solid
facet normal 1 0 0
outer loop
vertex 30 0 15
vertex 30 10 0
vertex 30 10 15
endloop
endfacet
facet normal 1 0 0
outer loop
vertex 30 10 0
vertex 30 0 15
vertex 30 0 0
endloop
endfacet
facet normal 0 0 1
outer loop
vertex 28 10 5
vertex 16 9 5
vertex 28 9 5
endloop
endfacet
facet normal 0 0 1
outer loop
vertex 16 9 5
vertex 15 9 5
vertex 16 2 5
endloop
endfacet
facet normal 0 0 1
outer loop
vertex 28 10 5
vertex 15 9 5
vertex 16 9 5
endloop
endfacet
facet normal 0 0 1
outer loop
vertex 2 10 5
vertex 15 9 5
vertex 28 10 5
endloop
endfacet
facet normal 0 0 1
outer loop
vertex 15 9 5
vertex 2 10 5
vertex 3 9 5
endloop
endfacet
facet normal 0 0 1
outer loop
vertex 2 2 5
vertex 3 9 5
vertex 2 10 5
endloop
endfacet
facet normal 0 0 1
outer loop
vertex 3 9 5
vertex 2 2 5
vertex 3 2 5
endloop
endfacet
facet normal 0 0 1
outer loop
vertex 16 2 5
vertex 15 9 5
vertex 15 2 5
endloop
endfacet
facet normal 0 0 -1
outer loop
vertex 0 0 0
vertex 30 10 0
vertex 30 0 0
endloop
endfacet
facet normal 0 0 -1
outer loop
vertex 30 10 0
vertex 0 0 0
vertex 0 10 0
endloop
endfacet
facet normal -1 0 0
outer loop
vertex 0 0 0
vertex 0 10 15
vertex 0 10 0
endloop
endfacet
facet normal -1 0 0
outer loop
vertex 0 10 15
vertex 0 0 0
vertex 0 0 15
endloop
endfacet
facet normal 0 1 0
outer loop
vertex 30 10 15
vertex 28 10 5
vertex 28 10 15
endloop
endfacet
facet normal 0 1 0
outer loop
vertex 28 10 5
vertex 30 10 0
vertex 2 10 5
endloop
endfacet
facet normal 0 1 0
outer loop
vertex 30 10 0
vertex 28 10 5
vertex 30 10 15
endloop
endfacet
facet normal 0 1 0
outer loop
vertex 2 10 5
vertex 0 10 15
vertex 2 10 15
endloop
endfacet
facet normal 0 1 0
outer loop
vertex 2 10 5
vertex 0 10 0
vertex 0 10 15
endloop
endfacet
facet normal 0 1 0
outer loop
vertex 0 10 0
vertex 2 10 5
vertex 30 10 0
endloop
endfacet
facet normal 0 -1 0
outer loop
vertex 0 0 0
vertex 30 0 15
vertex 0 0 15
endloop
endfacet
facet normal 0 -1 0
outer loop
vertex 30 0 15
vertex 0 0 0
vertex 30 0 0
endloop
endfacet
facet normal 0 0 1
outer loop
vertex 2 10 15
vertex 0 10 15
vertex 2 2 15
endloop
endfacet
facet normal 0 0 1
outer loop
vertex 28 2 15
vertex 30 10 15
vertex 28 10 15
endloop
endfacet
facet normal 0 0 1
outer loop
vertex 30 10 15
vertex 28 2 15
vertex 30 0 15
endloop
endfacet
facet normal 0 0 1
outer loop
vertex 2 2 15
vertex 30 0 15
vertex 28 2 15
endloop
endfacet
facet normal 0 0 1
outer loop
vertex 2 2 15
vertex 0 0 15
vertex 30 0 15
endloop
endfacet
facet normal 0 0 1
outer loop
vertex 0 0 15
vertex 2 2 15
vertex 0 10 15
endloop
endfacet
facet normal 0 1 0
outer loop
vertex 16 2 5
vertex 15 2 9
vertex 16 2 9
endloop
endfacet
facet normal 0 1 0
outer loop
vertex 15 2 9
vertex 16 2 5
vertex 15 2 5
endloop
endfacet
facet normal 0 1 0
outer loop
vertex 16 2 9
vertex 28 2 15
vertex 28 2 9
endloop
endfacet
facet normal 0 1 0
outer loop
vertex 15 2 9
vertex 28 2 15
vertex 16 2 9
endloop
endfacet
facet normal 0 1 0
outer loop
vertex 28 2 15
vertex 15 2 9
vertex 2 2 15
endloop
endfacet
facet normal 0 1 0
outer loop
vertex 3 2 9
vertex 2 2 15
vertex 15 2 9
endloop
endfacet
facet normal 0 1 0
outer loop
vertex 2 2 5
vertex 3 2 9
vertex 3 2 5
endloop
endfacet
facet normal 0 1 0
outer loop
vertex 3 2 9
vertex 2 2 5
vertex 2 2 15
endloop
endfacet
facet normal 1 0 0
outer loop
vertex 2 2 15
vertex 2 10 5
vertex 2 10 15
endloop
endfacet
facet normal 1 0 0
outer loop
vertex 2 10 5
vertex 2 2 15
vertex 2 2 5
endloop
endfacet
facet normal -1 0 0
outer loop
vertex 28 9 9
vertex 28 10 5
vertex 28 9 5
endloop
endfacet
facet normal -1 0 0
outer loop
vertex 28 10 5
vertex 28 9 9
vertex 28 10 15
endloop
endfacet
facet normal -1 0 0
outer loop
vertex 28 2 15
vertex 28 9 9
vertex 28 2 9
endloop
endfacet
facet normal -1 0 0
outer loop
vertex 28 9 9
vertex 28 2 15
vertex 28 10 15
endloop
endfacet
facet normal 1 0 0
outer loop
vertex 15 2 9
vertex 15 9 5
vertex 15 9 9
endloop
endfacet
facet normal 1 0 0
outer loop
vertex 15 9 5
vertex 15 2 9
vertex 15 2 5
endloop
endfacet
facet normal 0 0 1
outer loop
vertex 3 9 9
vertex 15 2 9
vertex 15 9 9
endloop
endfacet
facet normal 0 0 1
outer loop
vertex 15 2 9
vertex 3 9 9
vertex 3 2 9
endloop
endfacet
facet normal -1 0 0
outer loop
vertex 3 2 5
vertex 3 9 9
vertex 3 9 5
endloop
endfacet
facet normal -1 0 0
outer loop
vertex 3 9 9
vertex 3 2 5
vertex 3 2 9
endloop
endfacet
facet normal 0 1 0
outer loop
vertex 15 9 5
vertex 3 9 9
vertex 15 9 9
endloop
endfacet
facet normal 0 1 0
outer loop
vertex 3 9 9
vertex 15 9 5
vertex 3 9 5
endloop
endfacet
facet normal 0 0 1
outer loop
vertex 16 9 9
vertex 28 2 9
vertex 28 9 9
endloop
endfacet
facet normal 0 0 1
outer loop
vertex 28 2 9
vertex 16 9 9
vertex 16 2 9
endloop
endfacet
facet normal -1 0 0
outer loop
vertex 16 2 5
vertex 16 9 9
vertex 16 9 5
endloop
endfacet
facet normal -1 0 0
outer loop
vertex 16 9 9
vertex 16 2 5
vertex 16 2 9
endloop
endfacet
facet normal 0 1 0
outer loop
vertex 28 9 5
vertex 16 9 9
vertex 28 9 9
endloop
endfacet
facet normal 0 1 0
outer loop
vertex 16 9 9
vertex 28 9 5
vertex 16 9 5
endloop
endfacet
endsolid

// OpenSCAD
// Base of the couch
translate([0, 0, 0])
cube([30, 10, 5]);

// Backrest
translate([0, 0, 5])
cube([30, 2, 10]);

// Armrests
translate([0, 0, 5])
cube([2, 10, 10]);
translate([28, 0, 5])
cube([2, 10, 10]);

// Cushions
translate([3, 1, 5])
cube([12, 8, 4]);
translate([16, 1, 5])
cube([12, 8, 4]);
